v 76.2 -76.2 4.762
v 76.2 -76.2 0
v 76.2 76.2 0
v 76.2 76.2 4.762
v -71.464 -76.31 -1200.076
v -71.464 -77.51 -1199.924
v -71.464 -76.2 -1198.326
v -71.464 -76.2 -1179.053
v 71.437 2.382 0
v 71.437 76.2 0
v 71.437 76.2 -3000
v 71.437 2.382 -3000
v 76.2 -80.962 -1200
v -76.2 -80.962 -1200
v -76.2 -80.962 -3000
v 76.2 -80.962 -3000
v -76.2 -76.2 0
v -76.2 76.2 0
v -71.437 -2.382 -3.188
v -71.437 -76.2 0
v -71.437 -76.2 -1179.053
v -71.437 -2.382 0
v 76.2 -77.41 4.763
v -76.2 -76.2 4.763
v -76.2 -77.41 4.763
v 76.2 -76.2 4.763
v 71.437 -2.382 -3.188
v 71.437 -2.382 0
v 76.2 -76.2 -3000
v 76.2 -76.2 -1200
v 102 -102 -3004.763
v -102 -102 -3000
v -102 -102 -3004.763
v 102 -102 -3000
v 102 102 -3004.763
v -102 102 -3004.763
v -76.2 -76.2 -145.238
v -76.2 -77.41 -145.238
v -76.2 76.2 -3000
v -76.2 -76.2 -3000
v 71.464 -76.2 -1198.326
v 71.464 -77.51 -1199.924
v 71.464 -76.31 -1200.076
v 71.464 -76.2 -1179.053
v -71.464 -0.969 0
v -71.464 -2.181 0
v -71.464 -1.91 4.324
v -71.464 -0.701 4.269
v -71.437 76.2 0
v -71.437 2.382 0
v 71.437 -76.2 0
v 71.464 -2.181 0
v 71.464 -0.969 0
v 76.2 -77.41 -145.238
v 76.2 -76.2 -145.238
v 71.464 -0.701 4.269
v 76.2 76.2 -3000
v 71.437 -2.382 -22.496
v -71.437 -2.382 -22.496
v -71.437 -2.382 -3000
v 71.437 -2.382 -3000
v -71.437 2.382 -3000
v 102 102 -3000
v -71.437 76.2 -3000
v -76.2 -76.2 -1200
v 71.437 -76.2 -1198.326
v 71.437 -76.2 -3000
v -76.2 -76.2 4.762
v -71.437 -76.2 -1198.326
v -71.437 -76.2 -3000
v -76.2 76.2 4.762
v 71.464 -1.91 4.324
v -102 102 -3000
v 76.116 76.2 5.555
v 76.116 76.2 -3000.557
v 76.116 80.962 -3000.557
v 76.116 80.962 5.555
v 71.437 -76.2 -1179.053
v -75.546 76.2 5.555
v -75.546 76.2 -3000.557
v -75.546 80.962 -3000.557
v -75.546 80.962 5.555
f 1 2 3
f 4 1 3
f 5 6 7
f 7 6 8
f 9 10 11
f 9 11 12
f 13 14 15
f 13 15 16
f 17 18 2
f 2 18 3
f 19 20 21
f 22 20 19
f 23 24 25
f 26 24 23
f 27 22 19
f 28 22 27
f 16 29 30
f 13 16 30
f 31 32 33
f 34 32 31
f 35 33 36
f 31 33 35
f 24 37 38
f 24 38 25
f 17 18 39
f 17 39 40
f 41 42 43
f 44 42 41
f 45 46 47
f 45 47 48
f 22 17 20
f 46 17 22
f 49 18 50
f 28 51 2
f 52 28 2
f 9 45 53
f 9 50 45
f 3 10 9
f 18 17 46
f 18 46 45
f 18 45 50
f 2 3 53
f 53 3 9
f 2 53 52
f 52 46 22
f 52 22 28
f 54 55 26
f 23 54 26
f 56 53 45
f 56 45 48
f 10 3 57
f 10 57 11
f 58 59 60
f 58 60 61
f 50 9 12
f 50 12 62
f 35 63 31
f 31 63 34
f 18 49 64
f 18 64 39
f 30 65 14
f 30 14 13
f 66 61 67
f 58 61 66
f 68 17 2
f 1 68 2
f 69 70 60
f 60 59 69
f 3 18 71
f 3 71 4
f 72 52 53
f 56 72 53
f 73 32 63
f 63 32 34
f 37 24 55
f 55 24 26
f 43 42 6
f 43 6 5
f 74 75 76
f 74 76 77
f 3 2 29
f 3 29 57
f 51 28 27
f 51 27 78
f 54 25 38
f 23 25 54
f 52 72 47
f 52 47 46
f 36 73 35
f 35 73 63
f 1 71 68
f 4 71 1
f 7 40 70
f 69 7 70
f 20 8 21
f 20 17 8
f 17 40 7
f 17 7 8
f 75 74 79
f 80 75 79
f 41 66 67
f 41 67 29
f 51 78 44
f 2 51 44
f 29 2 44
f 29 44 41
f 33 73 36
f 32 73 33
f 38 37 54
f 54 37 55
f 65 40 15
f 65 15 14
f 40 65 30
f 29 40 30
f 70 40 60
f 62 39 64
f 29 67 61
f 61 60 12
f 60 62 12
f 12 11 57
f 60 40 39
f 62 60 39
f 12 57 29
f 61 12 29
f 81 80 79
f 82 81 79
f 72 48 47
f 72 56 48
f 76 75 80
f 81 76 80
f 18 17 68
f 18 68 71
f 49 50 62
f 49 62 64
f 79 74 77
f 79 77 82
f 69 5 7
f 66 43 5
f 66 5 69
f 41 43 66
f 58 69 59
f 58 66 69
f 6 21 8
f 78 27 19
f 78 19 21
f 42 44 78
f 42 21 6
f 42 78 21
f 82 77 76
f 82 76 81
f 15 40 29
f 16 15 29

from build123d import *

# Parameters (mm, degrees)
F1_DEPTH  = 3000
F2_W      = 152.4
F2_H      = 152.4
F3_DEPTH  = 4.7625
F4_W      = 151.6622528434
F4_H      = 3006.1117890291
F5_DEPTH  = 4.7625
F6_W      = 152.4
F6_H      = 150
F7_DEPTH  = 1.21
F9_DEPTH  = 71.464
F10_W     = 152.4
F10_H     = 1800
F11_DEPTH = 4.7625
F12_W     = 204
F12_H     = 204
F13_DEPTH = 4.763


# Not quite as in the source:
# - a length typed as a fraction of an inch, garbled in the dataset ("3 / 203.2 mm" for 3/8 in), is restored


with BuildPart() as f1:
    # F0 (on Top) → F1 (new body)
    with BuildSketch(Plane.XY):
        Polygon((-76.2, 76.2), (-76.2, -76.2), (-71.437, -76.2), (-71.437, -2.3815), (71.437, -2.3815), (71.437, -76.2), (76.2, -76.2), (76.2, 76.2), (71.437, 76.2), (71.437, 2.382), (-71.437, 2.382), (-71.437, 76.2), align=None)
    extrude(amount=-F1_DEPTH)

    # F8 (on Right) → F9 (join, symmetric)
    with BuildSketch(Plane.YZ):
        Polygon((-0.7011980658, 4.2686027455), (-1.9099500496, 4.323544912), (-77.5102381694, -1199.9238790681), (-76.3098538914, -1200.0761209319), align=None)
    extrude(amount=F9_DEPTH, both=True)


with BuildPart() as f3:
    # F2 (on face) → F3 (new body)
    with BuildSketch(Plane.XY):
        Rectangle(F2_W, F2_H)
    extrude(amount=F3_DEPTH)


with BuildPart() as f5:
    # F4 (on face) → F5 (new body)
    with BuildSketch(Plane(origin=(0, 76.2, 0), x_dir=(-1, 0, 0), z_dir=(0, 1, 0))):
        with Locations((-0.2847127616, -1497.5008128677)):
            Rectangle(F4_W, F4_H)
    extrude(amount=F5_DEPTH)


with BuildPart() as f7:
    # F6 (on face) → F7 (new body)
    with BuildSketch(Plane.XZ.offset(76.2)):
        with Locations((0, -70.2375)):
            Rectangle(F6_W, F6_H)
    extrude(amount=F7_DEPTH)


with BuildPart() as f11:
    # F10 (on face) → F11 (new body)
    with BuildSketch(Plane.XZ.offset(76.2)):
        with Locations((0, -2100)):
            Rectangle(F10_W, F10_H)
    extrude(amount=F11_DEPTH)


with BuildPart() as f13:
    # F12 (on face) → F13 (new body)
    with BuildSketch(Plane(origin=(0, 0, -3000), x_dir=(1, 0, 0), z_dir=(0, 0, -1))):
        Rectangle(F12_W, F12_H)
    extrude(amount=F13_DEPTH)


solid = Compound([f1.part, f3.part, f5.part, f7.part, f11.part, f13.part])
